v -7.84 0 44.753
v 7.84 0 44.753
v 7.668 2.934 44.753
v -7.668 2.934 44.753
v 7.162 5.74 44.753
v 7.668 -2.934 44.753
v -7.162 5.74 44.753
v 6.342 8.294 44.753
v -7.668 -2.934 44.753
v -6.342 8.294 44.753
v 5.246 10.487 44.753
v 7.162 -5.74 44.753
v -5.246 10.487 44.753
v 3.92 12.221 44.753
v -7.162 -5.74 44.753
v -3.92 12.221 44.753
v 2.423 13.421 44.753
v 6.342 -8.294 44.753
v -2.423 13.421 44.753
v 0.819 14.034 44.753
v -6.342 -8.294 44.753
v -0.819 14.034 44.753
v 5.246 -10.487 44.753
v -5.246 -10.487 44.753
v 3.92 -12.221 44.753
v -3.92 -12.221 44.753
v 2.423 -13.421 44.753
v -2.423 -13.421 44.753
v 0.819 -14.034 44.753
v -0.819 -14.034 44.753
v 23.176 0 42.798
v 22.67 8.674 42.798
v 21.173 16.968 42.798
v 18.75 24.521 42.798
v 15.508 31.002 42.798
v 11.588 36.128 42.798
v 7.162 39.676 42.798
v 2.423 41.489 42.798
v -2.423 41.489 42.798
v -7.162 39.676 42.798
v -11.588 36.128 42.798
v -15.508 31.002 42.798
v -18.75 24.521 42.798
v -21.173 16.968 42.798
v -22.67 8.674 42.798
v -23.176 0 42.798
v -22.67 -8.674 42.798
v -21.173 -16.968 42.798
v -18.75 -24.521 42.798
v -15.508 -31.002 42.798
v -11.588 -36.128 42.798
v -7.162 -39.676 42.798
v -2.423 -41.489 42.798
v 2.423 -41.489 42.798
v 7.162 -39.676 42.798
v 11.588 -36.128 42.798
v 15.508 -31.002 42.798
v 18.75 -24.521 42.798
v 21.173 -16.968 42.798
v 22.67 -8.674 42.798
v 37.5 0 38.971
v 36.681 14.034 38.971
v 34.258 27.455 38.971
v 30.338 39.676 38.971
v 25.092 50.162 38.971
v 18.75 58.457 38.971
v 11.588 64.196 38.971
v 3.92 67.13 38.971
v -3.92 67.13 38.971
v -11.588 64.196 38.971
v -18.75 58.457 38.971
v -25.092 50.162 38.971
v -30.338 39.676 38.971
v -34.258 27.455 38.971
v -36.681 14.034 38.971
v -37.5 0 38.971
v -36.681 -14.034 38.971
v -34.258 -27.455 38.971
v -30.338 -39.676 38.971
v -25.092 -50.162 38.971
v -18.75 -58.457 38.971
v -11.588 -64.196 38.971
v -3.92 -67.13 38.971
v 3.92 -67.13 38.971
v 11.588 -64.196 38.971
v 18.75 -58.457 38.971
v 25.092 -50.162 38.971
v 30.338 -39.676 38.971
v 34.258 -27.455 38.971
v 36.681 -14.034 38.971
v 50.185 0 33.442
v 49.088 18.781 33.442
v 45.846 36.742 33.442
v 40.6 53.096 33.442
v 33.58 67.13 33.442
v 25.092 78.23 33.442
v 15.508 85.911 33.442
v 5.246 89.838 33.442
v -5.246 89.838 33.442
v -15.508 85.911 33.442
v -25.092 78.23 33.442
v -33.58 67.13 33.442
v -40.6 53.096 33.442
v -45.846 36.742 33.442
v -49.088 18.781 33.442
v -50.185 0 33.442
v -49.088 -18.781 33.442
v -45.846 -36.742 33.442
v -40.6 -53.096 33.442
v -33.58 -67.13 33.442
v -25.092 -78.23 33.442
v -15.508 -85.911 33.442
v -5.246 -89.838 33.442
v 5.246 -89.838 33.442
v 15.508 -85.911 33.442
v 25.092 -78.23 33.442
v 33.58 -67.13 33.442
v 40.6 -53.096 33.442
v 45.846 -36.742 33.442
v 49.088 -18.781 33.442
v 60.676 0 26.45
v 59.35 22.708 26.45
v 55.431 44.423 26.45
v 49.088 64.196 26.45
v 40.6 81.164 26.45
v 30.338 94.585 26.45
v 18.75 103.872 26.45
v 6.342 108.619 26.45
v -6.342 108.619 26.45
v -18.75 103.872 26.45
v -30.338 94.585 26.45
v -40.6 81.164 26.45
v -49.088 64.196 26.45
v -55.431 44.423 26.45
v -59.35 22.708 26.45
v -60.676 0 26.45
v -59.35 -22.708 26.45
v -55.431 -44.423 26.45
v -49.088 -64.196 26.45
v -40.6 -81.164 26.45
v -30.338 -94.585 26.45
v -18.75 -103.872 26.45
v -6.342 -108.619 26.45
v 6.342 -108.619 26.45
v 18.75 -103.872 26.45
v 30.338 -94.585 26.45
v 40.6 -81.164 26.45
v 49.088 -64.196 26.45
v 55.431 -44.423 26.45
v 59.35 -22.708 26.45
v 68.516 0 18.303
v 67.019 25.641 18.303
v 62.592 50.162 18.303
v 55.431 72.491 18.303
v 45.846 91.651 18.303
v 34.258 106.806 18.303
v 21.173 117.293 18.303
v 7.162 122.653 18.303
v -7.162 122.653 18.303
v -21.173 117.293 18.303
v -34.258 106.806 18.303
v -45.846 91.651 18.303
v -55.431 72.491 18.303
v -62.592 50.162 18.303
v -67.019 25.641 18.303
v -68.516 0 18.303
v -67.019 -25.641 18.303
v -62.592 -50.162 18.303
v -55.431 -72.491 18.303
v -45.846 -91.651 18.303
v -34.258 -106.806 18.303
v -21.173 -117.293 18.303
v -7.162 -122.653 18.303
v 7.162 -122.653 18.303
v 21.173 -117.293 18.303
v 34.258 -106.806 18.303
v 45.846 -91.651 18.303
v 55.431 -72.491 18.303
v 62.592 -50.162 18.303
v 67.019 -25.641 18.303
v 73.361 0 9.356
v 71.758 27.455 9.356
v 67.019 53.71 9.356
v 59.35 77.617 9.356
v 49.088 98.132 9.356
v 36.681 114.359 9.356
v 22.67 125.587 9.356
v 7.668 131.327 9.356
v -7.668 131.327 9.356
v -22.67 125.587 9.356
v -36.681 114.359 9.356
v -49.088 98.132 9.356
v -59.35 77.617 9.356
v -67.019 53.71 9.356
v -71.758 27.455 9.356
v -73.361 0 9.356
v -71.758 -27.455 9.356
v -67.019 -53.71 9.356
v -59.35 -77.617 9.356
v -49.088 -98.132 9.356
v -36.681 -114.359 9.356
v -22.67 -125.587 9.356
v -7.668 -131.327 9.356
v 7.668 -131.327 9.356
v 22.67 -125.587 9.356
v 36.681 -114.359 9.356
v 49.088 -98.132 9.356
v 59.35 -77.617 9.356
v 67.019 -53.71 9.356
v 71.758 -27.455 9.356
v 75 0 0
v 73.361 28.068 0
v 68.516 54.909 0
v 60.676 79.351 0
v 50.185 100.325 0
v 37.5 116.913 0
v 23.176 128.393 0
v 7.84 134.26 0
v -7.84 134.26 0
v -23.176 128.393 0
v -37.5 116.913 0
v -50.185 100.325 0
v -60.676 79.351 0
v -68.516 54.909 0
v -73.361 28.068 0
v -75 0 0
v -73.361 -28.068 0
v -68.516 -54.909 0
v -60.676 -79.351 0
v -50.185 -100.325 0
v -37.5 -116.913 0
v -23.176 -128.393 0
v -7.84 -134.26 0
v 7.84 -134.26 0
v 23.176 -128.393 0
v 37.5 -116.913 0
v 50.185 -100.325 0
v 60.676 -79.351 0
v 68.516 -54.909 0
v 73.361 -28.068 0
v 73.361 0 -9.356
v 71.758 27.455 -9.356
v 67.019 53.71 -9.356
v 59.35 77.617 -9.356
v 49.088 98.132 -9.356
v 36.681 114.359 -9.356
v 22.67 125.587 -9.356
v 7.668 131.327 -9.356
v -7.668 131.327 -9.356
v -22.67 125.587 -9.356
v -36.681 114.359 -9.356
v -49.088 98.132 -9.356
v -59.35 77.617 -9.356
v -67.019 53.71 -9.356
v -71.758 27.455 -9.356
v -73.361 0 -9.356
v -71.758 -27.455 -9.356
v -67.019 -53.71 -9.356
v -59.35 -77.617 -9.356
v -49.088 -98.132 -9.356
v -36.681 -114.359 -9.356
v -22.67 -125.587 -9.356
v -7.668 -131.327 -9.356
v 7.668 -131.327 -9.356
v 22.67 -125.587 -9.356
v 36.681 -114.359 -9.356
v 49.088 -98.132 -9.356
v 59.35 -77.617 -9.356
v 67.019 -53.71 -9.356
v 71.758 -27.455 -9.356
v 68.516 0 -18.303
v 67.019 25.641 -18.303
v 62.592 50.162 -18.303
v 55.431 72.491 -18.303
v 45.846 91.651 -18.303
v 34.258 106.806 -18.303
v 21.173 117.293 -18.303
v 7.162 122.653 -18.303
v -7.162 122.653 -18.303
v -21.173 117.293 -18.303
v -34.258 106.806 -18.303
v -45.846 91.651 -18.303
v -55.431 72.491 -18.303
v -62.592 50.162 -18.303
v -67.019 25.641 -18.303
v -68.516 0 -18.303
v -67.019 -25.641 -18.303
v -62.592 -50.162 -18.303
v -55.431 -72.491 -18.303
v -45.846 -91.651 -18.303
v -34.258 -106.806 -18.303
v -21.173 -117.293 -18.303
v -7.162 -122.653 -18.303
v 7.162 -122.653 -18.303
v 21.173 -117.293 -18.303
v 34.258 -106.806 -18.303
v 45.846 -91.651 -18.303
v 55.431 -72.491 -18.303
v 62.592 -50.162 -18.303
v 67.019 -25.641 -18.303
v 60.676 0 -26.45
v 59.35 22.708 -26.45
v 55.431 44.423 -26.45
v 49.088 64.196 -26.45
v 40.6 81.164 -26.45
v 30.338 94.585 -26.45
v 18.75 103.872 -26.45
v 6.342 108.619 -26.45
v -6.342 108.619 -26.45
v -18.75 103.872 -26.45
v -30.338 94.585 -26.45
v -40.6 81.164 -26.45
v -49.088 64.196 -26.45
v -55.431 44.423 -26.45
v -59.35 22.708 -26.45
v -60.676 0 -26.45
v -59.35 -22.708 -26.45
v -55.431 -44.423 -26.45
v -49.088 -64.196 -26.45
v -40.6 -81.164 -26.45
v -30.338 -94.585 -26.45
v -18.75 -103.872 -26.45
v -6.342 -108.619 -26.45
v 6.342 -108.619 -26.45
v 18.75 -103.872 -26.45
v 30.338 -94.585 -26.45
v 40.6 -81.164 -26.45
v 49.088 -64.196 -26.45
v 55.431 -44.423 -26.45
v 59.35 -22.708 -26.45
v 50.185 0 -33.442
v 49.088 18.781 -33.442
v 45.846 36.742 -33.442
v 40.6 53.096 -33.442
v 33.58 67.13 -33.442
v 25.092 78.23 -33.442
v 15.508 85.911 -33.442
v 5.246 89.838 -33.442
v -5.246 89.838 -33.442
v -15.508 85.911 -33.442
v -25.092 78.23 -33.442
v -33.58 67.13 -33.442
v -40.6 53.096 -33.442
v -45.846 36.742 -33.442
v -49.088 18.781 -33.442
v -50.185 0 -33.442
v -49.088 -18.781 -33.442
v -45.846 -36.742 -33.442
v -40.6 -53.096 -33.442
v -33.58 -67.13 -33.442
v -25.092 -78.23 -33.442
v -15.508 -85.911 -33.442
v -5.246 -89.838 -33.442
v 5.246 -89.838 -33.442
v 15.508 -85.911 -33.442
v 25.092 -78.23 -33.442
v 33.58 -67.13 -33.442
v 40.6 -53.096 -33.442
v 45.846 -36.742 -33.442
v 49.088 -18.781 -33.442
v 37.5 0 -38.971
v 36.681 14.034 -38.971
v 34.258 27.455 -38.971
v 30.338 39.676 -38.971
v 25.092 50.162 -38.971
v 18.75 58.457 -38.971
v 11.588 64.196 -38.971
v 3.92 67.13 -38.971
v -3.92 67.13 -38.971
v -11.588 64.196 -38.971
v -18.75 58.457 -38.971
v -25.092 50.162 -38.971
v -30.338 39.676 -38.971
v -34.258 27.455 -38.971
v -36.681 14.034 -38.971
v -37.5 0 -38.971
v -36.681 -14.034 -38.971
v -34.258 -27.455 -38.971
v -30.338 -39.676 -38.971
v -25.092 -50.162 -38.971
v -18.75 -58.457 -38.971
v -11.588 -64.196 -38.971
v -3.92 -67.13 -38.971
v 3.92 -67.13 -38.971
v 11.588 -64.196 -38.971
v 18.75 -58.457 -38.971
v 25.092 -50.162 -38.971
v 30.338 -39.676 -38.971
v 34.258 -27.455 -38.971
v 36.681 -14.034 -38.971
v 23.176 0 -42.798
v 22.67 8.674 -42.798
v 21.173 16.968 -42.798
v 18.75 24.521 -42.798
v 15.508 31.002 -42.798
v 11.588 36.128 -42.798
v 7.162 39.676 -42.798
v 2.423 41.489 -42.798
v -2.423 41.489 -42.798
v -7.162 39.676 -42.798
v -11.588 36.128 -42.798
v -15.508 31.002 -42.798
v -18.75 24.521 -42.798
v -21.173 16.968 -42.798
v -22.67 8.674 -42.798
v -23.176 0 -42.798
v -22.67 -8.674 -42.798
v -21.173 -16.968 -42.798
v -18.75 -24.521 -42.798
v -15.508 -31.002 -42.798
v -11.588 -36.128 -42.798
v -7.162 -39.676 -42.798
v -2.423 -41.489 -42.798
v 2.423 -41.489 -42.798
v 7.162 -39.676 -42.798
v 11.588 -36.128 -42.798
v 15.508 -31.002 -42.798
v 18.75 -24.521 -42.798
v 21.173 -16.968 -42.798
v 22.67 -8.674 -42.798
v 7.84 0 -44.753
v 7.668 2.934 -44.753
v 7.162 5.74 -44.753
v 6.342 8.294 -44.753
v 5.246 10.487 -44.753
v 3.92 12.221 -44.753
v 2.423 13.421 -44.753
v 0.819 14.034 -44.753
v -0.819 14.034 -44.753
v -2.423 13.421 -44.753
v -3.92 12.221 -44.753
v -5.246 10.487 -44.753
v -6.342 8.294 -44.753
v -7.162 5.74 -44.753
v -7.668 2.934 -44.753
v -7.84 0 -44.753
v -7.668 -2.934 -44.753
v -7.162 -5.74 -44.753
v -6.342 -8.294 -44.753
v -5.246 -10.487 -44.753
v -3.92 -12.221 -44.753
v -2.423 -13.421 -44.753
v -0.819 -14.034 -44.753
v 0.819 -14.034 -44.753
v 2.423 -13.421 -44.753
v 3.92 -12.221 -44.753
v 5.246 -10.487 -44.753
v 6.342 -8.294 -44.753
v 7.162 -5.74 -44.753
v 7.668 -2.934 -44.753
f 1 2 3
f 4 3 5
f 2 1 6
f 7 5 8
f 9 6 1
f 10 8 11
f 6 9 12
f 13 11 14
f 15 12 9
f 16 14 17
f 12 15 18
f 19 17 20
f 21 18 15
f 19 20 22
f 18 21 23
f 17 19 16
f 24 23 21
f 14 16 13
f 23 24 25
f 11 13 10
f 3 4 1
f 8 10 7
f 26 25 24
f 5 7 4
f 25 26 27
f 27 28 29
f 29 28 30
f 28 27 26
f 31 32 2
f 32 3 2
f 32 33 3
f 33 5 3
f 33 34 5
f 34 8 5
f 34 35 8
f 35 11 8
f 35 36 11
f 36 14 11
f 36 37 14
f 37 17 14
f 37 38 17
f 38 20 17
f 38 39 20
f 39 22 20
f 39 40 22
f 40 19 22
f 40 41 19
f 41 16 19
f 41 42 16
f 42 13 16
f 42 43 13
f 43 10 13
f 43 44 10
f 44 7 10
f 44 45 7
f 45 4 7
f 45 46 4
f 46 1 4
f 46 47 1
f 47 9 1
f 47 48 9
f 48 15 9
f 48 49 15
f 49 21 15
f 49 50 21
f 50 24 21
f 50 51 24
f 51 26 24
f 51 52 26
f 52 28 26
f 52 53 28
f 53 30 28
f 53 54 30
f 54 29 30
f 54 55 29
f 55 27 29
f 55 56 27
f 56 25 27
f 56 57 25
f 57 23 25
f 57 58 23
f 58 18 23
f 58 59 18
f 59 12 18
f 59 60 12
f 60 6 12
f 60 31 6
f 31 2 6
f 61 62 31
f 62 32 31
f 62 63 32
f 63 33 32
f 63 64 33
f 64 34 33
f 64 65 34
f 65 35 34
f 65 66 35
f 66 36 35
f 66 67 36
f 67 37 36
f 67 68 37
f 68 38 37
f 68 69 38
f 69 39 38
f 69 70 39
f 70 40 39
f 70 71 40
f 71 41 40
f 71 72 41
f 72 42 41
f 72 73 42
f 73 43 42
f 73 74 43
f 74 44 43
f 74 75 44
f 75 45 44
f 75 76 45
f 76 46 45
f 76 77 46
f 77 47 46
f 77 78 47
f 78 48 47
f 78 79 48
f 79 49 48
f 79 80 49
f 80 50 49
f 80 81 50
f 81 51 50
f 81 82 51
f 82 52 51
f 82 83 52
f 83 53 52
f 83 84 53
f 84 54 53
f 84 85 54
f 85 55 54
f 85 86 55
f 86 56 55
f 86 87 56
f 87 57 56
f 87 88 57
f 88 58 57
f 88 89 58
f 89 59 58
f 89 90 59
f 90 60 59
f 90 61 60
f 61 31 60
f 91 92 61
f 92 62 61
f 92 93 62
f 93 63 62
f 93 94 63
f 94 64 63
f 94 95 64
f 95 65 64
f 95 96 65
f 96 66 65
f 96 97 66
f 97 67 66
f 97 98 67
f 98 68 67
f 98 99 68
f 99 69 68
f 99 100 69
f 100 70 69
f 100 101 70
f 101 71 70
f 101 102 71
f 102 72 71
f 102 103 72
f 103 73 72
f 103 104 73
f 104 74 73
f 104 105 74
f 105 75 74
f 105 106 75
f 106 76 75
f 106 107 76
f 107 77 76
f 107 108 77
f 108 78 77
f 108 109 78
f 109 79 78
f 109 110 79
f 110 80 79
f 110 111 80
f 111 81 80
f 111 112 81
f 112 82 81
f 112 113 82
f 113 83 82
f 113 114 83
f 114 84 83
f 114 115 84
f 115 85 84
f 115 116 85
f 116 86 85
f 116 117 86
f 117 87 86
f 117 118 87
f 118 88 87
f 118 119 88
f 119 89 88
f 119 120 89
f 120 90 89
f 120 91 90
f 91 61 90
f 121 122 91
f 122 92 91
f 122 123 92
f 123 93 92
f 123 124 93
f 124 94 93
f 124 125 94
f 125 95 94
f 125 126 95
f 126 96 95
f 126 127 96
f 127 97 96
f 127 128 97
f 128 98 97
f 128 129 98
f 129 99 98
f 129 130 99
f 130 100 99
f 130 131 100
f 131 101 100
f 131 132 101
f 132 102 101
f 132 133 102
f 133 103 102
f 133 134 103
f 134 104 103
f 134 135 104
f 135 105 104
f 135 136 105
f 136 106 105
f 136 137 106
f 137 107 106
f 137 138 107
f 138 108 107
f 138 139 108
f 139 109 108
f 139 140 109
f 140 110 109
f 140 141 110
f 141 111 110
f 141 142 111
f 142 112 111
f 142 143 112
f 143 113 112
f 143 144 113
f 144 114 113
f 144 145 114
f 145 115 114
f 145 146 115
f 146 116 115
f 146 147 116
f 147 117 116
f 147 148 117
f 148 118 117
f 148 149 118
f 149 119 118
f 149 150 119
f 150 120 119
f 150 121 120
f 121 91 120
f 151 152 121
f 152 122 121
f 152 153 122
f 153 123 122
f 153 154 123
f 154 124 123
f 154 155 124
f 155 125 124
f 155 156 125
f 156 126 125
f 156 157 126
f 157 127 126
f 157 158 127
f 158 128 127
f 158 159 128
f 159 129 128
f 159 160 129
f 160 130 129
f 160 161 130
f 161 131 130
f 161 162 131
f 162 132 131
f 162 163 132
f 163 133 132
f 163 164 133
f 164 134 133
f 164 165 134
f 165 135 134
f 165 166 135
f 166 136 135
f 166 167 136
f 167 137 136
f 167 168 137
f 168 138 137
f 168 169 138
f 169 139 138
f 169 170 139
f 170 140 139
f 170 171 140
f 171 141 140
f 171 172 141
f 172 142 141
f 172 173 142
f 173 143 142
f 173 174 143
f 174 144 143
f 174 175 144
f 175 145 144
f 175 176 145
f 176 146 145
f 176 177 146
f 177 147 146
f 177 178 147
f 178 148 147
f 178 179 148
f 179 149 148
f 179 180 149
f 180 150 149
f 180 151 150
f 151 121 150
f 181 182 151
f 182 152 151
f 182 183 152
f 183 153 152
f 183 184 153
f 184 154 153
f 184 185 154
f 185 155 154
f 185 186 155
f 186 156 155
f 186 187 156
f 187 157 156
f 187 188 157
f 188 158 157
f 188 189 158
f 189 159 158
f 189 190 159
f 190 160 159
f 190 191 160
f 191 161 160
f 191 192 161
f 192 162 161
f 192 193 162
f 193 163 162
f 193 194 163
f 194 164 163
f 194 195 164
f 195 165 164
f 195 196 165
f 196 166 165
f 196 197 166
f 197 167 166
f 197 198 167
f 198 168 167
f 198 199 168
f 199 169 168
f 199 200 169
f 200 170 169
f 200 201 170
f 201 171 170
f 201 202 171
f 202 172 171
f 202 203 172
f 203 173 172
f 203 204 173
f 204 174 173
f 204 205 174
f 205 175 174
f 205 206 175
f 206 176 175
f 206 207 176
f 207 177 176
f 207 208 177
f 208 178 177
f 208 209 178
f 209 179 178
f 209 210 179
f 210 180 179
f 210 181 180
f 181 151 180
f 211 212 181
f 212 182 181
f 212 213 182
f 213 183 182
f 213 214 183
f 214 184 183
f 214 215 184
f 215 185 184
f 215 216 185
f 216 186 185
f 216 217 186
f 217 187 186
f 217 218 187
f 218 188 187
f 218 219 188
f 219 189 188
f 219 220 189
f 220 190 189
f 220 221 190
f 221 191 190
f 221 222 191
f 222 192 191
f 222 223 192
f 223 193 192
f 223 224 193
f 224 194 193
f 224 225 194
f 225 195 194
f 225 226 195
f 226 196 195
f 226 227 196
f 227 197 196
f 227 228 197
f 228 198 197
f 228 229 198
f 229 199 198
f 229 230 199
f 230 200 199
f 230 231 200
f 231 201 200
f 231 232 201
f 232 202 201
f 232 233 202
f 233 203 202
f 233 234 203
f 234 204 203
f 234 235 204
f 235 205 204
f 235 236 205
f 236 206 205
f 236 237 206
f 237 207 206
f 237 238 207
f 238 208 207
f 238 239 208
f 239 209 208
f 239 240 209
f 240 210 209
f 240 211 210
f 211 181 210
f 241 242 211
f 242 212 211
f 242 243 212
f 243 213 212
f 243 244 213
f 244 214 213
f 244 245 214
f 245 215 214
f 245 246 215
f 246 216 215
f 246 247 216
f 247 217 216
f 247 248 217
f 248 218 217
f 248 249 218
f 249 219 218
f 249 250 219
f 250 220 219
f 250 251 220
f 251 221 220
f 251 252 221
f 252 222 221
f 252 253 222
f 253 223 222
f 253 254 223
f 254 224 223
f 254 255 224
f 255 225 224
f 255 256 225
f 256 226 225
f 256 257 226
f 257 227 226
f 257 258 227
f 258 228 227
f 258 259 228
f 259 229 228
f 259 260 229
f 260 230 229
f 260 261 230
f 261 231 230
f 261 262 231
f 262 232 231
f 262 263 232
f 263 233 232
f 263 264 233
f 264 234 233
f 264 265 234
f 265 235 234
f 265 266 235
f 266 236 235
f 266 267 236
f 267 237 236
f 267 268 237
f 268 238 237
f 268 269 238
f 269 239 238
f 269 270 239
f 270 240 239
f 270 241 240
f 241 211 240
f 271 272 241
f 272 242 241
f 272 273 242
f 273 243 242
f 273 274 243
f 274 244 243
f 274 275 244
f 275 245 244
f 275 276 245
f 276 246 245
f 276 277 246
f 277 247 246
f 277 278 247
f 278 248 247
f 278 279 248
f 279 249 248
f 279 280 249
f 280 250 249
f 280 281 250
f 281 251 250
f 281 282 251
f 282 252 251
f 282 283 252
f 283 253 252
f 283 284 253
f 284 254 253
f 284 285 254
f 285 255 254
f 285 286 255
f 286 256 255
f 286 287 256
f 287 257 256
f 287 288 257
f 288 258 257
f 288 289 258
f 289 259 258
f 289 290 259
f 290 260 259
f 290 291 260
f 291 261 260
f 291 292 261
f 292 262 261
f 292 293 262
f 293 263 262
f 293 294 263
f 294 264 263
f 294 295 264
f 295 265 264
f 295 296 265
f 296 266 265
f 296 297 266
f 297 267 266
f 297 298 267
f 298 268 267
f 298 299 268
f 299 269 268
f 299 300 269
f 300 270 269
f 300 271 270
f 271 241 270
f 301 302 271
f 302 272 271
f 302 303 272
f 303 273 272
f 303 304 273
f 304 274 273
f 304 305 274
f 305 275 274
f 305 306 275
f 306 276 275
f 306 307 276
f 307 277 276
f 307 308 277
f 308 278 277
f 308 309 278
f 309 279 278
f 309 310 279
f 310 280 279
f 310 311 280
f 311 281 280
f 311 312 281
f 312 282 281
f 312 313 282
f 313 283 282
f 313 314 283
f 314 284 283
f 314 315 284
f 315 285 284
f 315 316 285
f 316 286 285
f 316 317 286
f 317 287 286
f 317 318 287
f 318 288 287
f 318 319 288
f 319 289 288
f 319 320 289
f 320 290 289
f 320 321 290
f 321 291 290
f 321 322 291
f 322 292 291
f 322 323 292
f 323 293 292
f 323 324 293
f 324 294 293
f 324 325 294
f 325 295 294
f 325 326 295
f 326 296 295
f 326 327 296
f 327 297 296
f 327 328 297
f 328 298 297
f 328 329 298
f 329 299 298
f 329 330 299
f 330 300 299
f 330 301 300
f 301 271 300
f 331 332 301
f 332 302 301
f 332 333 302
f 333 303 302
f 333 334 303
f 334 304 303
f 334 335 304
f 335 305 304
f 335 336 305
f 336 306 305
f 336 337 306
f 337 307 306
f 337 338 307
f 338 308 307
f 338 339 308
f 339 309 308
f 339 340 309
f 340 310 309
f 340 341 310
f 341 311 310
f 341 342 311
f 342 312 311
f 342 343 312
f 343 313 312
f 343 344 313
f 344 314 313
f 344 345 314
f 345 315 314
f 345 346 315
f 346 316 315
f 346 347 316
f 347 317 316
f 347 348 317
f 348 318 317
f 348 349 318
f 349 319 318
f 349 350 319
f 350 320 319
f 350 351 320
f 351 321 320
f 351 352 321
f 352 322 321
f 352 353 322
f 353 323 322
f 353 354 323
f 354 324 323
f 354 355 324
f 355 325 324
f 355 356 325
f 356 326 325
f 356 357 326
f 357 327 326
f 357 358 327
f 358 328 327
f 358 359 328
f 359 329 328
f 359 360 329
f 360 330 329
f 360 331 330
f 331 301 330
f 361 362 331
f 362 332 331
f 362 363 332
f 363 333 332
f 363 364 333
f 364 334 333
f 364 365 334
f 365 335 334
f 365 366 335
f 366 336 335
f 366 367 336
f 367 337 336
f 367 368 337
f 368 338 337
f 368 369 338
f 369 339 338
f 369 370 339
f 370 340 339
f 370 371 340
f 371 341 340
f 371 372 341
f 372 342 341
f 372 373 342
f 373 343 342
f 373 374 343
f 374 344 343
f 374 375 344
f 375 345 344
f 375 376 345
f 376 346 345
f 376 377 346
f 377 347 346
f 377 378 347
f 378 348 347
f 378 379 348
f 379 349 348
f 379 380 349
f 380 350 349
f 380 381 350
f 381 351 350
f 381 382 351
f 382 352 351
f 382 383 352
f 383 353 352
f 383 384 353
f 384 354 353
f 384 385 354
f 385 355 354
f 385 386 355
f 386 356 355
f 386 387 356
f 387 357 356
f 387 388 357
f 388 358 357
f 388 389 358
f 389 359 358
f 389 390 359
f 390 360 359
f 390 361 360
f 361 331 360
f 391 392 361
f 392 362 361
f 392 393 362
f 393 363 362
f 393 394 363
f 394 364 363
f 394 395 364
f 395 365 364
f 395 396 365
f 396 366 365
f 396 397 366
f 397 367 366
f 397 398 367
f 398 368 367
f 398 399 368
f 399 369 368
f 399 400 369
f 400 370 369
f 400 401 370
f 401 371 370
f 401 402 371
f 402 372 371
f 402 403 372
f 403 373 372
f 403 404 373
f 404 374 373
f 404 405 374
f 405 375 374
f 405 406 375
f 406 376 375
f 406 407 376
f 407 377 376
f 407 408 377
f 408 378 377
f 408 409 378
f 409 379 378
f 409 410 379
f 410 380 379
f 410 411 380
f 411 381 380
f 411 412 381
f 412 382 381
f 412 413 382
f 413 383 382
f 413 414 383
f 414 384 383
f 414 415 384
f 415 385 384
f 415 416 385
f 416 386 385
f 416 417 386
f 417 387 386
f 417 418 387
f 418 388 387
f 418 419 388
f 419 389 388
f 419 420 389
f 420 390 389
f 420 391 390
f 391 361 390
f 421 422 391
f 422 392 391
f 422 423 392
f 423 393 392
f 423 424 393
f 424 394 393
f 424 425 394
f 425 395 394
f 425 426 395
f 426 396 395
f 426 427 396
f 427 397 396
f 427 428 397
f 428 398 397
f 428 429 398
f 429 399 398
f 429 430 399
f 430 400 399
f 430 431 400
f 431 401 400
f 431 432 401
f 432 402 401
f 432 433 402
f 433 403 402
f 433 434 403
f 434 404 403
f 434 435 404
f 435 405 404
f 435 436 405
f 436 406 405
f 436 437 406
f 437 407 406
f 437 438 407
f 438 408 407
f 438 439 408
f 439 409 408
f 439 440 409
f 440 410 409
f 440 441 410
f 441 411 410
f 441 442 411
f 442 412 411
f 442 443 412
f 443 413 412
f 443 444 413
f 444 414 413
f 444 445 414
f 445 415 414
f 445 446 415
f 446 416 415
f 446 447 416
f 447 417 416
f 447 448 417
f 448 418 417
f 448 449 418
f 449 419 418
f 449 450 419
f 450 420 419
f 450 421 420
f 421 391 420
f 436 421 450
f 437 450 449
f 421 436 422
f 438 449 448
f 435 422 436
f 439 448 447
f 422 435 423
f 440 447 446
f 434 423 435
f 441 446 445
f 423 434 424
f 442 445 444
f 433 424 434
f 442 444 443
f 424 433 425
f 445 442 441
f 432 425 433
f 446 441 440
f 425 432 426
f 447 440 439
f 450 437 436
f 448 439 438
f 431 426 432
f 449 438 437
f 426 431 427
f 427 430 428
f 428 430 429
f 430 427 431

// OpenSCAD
// Generated by SolidPython 1.0.1 on 2020-07-29 00:46:46


scale(v = [5, 9, 3]) {
	sphere(r = 15);
}
/***********************************************
*********      SolidPython code:      **********
************************************************
 
# import packages: SolidPython
from solid import *
from solid.utils import *
from itertools import chain, combinations, permutations


class Resize:

    def __init__(self, scad_file):
        self.scad_file = scad_file
        #self.scad_file = import_scad(scad_file)
        # cone/cylinder param:
        self.r1 = 0
        self.r2 = 0
        self.h = 0
        # rectangular prism param:
        self.w = 0
        self.l = 0
        # ellipse param:
        self.r = 0

    # import OpenScad code (file name corresponds to shape)


    # classify shape + parameters
    def assign(self, param1, param2, param3):
        if self.scad_file == 'cone.scad':
            self.r1 = param1
            self.r2 = param2
            self.h = param3
        elif self.scad_file == 'cylinder.scad':
            self.r1 = param1
            self.r2 = param2
            self.h = param3
        elif self.scad_file == 'rectangularPrism.scad':
            self.h = param1
            self.l = param2
            self.w = param3
        else:
            self.r = param1
            self.h = param2

    # resize parameters
    def iterate(self):
        x = range(3, 20, 2)
        i = 1
        if self.scad_file == 'cone.scad':
            tempList = list(permutations(x, 2))
            for temp in tempList:
                param1 = temp[0]
                param2 = temp[1]
                filepath = 'produced_scad_files/' + 'cone' + str(param1) + '_' + str(param2) + '_' + '.scad'
                scad_render_to_file(cylinder(h=param1, r1=param2, r2=0), filepath)

        elif self.scad_file == 'cylinder.scad':
            tempList = list(permutations(x, 3))
            for temp in tempList:
                param1 = temp[0]
                param2 = temp[1]
                filepath = 'produced_scad_files/' + 'cylinder' + str(param1) + '_' + str(param2) + '_' + '.scad'
                scad_render_to_file(cylinder(h=param1, r1=param2, r2=param2), filepath)

        elif self.scad_file == 'rectangularPrism.scad':
            tempList = list(permutations(x, 3))
            for temp in tempList:
                param1 = temp[0]
                param2 = temp[1]
                param3 = temp[2]
                filepath = 'produced_scad_files/' + 'rectangularPrism' + str(param1) + '_' + str(param2) + '_' + str(
                    param3) + '.scad'
                scad_render_to_file(cube(size=(param1, param2, param3)), filepath)

        elif self.scad_file == 'ellipse.scad':
            tempList = list(permutations(x, 4))
            for temp in tempList:
                param1 = temp[0]
                param2 = temp[1]
                param3 = temp[2]
                param4 = temp[3]
                filepath = 'produced_scad_files/' + 'ellipse' + str(param1) + '_' + str(param2) + '_' + str(param3) + '_' + str(param4) + '.scad'
                scad_render_to_file(scale([param1, param2, param3])(sphere(r=param4)), filepath)

    def render_to_scadfile(self):
        scad_render_to_file(scad, 'example.scad') 
 
************************************************/
